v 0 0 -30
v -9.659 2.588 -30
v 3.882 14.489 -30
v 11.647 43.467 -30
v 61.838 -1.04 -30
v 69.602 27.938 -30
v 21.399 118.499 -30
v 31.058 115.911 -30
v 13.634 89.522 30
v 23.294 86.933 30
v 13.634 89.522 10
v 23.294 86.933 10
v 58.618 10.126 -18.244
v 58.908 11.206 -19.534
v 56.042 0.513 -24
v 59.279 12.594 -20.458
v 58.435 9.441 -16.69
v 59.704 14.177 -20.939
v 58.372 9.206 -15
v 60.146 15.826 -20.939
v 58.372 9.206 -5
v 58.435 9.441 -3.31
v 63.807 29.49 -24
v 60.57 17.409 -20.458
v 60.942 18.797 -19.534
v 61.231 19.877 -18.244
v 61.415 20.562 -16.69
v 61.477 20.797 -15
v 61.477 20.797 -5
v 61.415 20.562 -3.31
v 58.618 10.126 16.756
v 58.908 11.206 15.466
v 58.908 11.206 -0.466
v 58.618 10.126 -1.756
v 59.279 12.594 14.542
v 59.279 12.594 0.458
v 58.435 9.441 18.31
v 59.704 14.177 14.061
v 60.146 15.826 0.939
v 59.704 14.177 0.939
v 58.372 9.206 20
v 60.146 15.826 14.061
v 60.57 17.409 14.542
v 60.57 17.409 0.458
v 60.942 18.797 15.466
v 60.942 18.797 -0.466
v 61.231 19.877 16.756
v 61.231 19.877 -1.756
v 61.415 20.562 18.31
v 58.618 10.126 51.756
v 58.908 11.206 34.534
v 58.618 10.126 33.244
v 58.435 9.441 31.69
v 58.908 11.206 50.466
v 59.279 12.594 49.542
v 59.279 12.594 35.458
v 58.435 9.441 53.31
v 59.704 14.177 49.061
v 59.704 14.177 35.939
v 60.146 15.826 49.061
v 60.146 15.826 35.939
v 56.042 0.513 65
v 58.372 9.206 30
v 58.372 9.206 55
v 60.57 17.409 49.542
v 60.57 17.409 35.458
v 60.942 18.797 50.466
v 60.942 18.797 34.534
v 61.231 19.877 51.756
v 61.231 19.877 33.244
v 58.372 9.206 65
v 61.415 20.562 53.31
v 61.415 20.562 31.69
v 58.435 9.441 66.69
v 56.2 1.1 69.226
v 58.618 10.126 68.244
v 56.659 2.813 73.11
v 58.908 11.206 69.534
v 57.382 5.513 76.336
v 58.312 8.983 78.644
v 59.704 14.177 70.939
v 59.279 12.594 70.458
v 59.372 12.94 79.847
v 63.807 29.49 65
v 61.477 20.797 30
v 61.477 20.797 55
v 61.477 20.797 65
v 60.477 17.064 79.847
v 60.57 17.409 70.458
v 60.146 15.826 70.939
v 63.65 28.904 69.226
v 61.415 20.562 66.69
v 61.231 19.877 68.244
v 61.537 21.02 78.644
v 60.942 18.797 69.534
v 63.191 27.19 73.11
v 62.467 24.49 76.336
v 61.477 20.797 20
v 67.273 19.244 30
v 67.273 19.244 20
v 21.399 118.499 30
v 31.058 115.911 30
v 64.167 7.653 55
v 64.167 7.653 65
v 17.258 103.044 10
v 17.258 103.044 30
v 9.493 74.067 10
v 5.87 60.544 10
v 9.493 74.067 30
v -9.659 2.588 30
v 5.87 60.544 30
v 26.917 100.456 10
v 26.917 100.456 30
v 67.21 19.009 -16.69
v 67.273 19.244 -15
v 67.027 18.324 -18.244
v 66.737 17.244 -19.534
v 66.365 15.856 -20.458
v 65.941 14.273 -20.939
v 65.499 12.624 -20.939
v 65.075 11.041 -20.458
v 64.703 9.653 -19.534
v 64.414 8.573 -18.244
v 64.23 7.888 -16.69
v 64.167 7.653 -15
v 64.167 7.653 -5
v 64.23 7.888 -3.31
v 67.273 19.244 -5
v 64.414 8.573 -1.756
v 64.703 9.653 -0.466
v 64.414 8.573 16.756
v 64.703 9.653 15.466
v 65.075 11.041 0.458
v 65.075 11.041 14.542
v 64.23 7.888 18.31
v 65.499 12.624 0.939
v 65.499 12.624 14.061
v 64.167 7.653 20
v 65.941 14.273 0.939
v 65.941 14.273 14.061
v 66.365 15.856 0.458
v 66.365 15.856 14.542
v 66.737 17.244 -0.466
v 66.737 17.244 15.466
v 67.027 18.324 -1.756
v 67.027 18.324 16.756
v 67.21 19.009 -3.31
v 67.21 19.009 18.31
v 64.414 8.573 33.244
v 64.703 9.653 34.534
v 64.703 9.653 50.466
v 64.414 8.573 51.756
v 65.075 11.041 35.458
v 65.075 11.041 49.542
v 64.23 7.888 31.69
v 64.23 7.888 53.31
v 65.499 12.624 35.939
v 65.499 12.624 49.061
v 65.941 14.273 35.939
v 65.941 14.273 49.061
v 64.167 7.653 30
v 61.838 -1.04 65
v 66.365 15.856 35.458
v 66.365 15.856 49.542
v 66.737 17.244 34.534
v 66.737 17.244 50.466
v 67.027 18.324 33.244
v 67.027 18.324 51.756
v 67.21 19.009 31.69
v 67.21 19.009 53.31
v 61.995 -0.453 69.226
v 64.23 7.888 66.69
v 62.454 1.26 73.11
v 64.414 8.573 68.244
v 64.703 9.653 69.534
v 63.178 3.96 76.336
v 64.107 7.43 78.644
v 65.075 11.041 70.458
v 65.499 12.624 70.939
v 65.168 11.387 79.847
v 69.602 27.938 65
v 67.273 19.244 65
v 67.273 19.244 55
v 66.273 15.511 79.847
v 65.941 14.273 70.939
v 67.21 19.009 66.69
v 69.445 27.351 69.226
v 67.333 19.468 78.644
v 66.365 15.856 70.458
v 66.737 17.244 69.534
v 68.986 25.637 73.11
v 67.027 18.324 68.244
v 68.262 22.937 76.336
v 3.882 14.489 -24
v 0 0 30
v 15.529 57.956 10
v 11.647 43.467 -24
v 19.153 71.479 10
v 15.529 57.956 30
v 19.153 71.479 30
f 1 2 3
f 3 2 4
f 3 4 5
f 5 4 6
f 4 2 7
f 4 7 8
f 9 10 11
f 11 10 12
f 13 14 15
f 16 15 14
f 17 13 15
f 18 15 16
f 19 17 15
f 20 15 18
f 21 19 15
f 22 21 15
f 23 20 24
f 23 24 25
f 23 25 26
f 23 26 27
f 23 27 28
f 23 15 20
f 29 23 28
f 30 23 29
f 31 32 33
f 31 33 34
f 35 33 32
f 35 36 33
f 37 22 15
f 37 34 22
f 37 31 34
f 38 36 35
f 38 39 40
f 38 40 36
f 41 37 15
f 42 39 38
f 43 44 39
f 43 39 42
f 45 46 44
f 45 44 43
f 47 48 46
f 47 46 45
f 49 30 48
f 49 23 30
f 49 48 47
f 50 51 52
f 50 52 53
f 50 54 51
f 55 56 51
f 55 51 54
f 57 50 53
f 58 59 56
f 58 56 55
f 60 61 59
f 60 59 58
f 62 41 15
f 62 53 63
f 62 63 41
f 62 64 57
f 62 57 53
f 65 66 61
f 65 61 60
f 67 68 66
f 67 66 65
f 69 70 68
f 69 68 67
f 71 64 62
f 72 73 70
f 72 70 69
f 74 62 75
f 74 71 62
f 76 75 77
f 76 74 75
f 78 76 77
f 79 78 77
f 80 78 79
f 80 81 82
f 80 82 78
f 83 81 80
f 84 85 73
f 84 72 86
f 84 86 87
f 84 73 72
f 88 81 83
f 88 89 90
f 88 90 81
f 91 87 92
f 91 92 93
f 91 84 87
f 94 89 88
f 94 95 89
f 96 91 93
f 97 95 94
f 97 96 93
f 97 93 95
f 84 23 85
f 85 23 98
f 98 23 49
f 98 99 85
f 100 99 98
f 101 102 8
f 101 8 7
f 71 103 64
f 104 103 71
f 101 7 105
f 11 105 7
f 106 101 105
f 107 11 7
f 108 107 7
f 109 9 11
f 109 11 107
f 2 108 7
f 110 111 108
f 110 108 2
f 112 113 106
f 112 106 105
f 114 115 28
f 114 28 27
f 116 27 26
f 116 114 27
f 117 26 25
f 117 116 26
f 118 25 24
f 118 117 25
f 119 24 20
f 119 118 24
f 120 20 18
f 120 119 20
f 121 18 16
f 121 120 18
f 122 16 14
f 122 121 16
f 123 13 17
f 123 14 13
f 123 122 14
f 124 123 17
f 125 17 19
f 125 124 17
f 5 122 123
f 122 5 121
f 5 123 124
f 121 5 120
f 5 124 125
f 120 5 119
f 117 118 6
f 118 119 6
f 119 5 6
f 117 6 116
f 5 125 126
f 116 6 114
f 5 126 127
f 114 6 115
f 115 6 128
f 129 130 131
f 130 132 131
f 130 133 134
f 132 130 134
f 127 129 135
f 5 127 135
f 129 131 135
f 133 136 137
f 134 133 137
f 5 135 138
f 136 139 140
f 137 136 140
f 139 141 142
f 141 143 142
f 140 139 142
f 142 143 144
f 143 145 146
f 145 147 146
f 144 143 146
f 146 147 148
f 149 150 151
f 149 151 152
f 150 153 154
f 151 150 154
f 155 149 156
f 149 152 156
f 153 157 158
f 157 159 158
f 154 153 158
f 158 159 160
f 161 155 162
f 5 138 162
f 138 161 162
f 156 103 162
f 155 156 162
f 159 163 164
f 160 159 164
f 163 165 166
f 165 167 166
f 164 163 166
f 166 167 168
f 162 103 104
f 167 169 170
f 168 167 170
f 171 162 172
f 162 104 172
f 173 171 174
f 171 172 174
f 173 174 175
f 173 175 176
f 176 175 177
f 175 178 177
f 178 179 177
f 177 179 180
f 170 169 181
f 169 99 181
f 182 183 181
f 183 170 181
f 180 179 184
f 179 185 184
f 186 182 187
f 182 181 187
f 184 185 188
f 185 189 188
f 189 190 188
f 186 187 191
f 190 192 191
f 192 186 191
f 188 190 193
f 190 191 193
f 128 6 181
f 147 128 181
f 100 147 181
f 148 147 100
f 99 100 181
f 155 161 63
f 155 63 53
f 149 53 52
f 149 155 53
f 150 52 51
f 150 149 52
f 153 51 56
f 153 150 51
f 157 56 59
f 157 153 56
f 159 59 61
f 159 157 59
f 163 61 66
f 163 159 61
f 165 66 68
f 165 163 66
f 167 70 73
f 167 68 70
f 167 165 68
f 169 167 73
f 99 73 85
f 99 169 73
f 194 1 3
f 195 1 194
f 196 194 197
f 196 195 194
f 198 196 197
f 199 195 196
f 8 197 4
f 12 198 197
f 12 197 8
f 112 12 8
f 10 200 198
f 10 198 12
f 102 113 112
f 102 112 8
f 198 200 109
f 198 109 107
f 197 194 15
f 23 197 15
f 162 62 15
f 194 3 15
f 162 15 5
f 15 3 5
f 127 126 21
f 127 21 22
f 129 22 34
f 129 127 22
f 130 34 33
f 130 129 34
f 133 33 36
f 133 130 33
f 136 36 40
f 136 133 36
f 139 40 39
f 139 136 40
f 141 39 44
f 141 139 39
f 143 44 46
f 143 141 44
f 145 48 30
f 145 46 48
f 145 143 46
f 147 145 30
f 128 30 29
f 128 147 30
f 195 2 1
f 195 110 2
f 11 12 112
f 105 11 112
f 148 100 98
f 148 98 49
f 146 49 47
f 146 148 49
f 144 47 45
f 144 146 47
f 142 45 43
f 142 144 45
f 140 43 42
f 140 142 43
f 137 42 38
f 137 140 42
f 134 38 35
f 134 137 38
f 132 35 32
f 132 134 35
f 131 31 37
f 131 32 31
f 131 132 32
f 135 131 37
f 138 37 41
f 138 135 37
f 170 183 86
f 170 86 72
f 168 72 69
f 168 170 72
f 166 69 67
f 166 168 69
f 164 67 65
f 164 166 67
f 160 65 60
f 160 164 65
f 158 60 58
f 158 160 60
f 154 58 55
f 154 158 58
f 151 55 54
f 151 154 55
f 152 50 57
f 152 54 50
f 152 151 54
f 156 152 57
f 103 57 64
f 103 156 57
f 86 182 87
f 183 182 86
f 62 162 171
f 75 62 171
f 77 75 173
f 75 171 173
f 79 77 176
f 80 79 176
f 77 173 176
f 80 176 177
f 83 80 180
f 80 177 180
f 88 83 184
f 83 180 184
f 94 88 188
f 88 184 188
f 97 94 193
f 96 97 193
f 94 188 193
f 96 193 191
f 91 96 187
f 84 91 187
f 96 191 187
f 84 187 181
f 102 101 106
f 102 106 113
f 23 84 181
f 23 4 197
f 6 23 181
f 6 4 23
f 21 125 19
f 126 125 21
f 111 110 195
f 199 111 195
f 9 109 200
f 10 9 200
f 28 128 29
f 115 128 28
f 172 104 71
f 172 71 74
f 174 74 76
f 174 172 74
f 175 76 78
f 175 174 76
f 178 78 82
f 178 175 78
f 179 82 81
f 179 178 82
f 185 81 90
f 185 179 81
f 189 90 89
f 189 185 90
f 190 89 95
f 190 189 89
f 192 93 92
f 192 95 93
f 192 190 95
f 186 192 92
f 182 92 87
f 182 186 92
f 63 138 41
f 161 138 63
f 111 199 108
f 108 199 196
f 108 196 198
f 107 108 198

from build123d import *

# Parameters (mm, degrees)
BOSS_EXTRUDE1_DEPTH = 30
SKETCH3_W           = 20
SKETCH3_H           = 14
CUT_EXTRUDE1_DEPTH  = 60
BOSS_EXTRUDE2_DEPTH = 15
BOSS_EXTRUDE3_DEPTH = 6
CUT_EXTRUDE2_DEPTH  = 30


with BuildPart() as part:
    # Sketch2 → Boss-Extrude1 (new, symmetric)
    with BuildSketch(Plane.XY):
        Polygon((-9.659258263, 2.588190451), (0, 0), (31.058285412, 115.911099155), (21.399027149, 118.499289606), align=None)
    extrude(amount=BOSS_EXTRUDE1_DEPTH, both=True)

    # Sketch3 → Cut-Extrude1 (cut)
    with BuildSketch(Plane(origin=(0, 0, 0), x_dir=(0, 0, -1), z_dir=(0.9659258262890692, -0.25881904510251785, 0))):
        with Locations((-20, 97)):
            Rectangle(SKETCH3_W, SKETCH3_H)
        with Locations((-20, 67)):
            Rectangle(SKETCH3_W, SKETCH3_H)
    extrude(amount=-CUT_EXTRUDE1_DEPTH, mode=Mode.SUBTRACT)

    # Sketch5 → Boss-Extrude2 (add, symmetric)
    with BuildSketch(Plane(origin=(7.764571353, 28.977774789, 0), x_dir=(-0.9659258262890692, 0.25881904510251746, 0), z_dir=(-0.25881904510251746, -0.9659258262890692, 0))):
        Polygon((0, 24), (-54, 24), (-54, -65), (-60, -65), (-60, 30), (0, 30), align=None)
    extrude(amount=BOSS_EXTRUDE2_DEPTH, both=True)

    # Sketch6 → Boss-Extrude3 (add)
    with BuildSketch(Plane(origin=(57.955549577, -15.529142706, 0), x_dir=(0, 0, -1), z_dir=(0.9659258262890692, -0.25881904510251746, 0))):
        with BuildLine():
            Line((-65, 45), (-65, 15))
            ThreePointArc((-65, 15), (-80, 30), (-65, 45))
        make_face()
    extrude(amount=-BOSS_EXTRUDE3_DEPTH)

    # Sketch7 → Cut-Extrude2 (cut)
    with BuildSketch(Plane(origin=(57.955549577, -15.529142706, 0), x_dir=(0, 0, -1), z_dir=(0.9659258262890692, -0.25881904510251746, 0))):
        with BuildLine():
            Line((-65, 36), (-55, 36))
            ThreePointArc((-55, 36), (-49, 30), (-55, 24))
            Line((-55, 24), (-65, 24))
            ThreePointArc((-65, 24), (-71, 30), (-65, 36))
        make_face()
        with BuildLine():
            Line((-30, 36), (-20, 36))
            ThreePointArc((-20, 36), (-14, 30), (-20, 24))
            Line((-20, 24), (-30, 24))
            ThreePointArc((-30, 24), (-36, 30), (-30, 36))
        make_face()
        with BuildLine():
            Line((5, 36), (15, 36))
            ThreePointArc((15, 36), (21, 30), (15, 24))
            Line((15, 24), (5, 24))
            ThreePointArc((5, 24), (-1, 30), (5, 36))
        make_face()
    extrude(amount=-CUT_EXTRUDE2_DEPTH, mode=Mode.SUBTRACT)


solid = part.part
